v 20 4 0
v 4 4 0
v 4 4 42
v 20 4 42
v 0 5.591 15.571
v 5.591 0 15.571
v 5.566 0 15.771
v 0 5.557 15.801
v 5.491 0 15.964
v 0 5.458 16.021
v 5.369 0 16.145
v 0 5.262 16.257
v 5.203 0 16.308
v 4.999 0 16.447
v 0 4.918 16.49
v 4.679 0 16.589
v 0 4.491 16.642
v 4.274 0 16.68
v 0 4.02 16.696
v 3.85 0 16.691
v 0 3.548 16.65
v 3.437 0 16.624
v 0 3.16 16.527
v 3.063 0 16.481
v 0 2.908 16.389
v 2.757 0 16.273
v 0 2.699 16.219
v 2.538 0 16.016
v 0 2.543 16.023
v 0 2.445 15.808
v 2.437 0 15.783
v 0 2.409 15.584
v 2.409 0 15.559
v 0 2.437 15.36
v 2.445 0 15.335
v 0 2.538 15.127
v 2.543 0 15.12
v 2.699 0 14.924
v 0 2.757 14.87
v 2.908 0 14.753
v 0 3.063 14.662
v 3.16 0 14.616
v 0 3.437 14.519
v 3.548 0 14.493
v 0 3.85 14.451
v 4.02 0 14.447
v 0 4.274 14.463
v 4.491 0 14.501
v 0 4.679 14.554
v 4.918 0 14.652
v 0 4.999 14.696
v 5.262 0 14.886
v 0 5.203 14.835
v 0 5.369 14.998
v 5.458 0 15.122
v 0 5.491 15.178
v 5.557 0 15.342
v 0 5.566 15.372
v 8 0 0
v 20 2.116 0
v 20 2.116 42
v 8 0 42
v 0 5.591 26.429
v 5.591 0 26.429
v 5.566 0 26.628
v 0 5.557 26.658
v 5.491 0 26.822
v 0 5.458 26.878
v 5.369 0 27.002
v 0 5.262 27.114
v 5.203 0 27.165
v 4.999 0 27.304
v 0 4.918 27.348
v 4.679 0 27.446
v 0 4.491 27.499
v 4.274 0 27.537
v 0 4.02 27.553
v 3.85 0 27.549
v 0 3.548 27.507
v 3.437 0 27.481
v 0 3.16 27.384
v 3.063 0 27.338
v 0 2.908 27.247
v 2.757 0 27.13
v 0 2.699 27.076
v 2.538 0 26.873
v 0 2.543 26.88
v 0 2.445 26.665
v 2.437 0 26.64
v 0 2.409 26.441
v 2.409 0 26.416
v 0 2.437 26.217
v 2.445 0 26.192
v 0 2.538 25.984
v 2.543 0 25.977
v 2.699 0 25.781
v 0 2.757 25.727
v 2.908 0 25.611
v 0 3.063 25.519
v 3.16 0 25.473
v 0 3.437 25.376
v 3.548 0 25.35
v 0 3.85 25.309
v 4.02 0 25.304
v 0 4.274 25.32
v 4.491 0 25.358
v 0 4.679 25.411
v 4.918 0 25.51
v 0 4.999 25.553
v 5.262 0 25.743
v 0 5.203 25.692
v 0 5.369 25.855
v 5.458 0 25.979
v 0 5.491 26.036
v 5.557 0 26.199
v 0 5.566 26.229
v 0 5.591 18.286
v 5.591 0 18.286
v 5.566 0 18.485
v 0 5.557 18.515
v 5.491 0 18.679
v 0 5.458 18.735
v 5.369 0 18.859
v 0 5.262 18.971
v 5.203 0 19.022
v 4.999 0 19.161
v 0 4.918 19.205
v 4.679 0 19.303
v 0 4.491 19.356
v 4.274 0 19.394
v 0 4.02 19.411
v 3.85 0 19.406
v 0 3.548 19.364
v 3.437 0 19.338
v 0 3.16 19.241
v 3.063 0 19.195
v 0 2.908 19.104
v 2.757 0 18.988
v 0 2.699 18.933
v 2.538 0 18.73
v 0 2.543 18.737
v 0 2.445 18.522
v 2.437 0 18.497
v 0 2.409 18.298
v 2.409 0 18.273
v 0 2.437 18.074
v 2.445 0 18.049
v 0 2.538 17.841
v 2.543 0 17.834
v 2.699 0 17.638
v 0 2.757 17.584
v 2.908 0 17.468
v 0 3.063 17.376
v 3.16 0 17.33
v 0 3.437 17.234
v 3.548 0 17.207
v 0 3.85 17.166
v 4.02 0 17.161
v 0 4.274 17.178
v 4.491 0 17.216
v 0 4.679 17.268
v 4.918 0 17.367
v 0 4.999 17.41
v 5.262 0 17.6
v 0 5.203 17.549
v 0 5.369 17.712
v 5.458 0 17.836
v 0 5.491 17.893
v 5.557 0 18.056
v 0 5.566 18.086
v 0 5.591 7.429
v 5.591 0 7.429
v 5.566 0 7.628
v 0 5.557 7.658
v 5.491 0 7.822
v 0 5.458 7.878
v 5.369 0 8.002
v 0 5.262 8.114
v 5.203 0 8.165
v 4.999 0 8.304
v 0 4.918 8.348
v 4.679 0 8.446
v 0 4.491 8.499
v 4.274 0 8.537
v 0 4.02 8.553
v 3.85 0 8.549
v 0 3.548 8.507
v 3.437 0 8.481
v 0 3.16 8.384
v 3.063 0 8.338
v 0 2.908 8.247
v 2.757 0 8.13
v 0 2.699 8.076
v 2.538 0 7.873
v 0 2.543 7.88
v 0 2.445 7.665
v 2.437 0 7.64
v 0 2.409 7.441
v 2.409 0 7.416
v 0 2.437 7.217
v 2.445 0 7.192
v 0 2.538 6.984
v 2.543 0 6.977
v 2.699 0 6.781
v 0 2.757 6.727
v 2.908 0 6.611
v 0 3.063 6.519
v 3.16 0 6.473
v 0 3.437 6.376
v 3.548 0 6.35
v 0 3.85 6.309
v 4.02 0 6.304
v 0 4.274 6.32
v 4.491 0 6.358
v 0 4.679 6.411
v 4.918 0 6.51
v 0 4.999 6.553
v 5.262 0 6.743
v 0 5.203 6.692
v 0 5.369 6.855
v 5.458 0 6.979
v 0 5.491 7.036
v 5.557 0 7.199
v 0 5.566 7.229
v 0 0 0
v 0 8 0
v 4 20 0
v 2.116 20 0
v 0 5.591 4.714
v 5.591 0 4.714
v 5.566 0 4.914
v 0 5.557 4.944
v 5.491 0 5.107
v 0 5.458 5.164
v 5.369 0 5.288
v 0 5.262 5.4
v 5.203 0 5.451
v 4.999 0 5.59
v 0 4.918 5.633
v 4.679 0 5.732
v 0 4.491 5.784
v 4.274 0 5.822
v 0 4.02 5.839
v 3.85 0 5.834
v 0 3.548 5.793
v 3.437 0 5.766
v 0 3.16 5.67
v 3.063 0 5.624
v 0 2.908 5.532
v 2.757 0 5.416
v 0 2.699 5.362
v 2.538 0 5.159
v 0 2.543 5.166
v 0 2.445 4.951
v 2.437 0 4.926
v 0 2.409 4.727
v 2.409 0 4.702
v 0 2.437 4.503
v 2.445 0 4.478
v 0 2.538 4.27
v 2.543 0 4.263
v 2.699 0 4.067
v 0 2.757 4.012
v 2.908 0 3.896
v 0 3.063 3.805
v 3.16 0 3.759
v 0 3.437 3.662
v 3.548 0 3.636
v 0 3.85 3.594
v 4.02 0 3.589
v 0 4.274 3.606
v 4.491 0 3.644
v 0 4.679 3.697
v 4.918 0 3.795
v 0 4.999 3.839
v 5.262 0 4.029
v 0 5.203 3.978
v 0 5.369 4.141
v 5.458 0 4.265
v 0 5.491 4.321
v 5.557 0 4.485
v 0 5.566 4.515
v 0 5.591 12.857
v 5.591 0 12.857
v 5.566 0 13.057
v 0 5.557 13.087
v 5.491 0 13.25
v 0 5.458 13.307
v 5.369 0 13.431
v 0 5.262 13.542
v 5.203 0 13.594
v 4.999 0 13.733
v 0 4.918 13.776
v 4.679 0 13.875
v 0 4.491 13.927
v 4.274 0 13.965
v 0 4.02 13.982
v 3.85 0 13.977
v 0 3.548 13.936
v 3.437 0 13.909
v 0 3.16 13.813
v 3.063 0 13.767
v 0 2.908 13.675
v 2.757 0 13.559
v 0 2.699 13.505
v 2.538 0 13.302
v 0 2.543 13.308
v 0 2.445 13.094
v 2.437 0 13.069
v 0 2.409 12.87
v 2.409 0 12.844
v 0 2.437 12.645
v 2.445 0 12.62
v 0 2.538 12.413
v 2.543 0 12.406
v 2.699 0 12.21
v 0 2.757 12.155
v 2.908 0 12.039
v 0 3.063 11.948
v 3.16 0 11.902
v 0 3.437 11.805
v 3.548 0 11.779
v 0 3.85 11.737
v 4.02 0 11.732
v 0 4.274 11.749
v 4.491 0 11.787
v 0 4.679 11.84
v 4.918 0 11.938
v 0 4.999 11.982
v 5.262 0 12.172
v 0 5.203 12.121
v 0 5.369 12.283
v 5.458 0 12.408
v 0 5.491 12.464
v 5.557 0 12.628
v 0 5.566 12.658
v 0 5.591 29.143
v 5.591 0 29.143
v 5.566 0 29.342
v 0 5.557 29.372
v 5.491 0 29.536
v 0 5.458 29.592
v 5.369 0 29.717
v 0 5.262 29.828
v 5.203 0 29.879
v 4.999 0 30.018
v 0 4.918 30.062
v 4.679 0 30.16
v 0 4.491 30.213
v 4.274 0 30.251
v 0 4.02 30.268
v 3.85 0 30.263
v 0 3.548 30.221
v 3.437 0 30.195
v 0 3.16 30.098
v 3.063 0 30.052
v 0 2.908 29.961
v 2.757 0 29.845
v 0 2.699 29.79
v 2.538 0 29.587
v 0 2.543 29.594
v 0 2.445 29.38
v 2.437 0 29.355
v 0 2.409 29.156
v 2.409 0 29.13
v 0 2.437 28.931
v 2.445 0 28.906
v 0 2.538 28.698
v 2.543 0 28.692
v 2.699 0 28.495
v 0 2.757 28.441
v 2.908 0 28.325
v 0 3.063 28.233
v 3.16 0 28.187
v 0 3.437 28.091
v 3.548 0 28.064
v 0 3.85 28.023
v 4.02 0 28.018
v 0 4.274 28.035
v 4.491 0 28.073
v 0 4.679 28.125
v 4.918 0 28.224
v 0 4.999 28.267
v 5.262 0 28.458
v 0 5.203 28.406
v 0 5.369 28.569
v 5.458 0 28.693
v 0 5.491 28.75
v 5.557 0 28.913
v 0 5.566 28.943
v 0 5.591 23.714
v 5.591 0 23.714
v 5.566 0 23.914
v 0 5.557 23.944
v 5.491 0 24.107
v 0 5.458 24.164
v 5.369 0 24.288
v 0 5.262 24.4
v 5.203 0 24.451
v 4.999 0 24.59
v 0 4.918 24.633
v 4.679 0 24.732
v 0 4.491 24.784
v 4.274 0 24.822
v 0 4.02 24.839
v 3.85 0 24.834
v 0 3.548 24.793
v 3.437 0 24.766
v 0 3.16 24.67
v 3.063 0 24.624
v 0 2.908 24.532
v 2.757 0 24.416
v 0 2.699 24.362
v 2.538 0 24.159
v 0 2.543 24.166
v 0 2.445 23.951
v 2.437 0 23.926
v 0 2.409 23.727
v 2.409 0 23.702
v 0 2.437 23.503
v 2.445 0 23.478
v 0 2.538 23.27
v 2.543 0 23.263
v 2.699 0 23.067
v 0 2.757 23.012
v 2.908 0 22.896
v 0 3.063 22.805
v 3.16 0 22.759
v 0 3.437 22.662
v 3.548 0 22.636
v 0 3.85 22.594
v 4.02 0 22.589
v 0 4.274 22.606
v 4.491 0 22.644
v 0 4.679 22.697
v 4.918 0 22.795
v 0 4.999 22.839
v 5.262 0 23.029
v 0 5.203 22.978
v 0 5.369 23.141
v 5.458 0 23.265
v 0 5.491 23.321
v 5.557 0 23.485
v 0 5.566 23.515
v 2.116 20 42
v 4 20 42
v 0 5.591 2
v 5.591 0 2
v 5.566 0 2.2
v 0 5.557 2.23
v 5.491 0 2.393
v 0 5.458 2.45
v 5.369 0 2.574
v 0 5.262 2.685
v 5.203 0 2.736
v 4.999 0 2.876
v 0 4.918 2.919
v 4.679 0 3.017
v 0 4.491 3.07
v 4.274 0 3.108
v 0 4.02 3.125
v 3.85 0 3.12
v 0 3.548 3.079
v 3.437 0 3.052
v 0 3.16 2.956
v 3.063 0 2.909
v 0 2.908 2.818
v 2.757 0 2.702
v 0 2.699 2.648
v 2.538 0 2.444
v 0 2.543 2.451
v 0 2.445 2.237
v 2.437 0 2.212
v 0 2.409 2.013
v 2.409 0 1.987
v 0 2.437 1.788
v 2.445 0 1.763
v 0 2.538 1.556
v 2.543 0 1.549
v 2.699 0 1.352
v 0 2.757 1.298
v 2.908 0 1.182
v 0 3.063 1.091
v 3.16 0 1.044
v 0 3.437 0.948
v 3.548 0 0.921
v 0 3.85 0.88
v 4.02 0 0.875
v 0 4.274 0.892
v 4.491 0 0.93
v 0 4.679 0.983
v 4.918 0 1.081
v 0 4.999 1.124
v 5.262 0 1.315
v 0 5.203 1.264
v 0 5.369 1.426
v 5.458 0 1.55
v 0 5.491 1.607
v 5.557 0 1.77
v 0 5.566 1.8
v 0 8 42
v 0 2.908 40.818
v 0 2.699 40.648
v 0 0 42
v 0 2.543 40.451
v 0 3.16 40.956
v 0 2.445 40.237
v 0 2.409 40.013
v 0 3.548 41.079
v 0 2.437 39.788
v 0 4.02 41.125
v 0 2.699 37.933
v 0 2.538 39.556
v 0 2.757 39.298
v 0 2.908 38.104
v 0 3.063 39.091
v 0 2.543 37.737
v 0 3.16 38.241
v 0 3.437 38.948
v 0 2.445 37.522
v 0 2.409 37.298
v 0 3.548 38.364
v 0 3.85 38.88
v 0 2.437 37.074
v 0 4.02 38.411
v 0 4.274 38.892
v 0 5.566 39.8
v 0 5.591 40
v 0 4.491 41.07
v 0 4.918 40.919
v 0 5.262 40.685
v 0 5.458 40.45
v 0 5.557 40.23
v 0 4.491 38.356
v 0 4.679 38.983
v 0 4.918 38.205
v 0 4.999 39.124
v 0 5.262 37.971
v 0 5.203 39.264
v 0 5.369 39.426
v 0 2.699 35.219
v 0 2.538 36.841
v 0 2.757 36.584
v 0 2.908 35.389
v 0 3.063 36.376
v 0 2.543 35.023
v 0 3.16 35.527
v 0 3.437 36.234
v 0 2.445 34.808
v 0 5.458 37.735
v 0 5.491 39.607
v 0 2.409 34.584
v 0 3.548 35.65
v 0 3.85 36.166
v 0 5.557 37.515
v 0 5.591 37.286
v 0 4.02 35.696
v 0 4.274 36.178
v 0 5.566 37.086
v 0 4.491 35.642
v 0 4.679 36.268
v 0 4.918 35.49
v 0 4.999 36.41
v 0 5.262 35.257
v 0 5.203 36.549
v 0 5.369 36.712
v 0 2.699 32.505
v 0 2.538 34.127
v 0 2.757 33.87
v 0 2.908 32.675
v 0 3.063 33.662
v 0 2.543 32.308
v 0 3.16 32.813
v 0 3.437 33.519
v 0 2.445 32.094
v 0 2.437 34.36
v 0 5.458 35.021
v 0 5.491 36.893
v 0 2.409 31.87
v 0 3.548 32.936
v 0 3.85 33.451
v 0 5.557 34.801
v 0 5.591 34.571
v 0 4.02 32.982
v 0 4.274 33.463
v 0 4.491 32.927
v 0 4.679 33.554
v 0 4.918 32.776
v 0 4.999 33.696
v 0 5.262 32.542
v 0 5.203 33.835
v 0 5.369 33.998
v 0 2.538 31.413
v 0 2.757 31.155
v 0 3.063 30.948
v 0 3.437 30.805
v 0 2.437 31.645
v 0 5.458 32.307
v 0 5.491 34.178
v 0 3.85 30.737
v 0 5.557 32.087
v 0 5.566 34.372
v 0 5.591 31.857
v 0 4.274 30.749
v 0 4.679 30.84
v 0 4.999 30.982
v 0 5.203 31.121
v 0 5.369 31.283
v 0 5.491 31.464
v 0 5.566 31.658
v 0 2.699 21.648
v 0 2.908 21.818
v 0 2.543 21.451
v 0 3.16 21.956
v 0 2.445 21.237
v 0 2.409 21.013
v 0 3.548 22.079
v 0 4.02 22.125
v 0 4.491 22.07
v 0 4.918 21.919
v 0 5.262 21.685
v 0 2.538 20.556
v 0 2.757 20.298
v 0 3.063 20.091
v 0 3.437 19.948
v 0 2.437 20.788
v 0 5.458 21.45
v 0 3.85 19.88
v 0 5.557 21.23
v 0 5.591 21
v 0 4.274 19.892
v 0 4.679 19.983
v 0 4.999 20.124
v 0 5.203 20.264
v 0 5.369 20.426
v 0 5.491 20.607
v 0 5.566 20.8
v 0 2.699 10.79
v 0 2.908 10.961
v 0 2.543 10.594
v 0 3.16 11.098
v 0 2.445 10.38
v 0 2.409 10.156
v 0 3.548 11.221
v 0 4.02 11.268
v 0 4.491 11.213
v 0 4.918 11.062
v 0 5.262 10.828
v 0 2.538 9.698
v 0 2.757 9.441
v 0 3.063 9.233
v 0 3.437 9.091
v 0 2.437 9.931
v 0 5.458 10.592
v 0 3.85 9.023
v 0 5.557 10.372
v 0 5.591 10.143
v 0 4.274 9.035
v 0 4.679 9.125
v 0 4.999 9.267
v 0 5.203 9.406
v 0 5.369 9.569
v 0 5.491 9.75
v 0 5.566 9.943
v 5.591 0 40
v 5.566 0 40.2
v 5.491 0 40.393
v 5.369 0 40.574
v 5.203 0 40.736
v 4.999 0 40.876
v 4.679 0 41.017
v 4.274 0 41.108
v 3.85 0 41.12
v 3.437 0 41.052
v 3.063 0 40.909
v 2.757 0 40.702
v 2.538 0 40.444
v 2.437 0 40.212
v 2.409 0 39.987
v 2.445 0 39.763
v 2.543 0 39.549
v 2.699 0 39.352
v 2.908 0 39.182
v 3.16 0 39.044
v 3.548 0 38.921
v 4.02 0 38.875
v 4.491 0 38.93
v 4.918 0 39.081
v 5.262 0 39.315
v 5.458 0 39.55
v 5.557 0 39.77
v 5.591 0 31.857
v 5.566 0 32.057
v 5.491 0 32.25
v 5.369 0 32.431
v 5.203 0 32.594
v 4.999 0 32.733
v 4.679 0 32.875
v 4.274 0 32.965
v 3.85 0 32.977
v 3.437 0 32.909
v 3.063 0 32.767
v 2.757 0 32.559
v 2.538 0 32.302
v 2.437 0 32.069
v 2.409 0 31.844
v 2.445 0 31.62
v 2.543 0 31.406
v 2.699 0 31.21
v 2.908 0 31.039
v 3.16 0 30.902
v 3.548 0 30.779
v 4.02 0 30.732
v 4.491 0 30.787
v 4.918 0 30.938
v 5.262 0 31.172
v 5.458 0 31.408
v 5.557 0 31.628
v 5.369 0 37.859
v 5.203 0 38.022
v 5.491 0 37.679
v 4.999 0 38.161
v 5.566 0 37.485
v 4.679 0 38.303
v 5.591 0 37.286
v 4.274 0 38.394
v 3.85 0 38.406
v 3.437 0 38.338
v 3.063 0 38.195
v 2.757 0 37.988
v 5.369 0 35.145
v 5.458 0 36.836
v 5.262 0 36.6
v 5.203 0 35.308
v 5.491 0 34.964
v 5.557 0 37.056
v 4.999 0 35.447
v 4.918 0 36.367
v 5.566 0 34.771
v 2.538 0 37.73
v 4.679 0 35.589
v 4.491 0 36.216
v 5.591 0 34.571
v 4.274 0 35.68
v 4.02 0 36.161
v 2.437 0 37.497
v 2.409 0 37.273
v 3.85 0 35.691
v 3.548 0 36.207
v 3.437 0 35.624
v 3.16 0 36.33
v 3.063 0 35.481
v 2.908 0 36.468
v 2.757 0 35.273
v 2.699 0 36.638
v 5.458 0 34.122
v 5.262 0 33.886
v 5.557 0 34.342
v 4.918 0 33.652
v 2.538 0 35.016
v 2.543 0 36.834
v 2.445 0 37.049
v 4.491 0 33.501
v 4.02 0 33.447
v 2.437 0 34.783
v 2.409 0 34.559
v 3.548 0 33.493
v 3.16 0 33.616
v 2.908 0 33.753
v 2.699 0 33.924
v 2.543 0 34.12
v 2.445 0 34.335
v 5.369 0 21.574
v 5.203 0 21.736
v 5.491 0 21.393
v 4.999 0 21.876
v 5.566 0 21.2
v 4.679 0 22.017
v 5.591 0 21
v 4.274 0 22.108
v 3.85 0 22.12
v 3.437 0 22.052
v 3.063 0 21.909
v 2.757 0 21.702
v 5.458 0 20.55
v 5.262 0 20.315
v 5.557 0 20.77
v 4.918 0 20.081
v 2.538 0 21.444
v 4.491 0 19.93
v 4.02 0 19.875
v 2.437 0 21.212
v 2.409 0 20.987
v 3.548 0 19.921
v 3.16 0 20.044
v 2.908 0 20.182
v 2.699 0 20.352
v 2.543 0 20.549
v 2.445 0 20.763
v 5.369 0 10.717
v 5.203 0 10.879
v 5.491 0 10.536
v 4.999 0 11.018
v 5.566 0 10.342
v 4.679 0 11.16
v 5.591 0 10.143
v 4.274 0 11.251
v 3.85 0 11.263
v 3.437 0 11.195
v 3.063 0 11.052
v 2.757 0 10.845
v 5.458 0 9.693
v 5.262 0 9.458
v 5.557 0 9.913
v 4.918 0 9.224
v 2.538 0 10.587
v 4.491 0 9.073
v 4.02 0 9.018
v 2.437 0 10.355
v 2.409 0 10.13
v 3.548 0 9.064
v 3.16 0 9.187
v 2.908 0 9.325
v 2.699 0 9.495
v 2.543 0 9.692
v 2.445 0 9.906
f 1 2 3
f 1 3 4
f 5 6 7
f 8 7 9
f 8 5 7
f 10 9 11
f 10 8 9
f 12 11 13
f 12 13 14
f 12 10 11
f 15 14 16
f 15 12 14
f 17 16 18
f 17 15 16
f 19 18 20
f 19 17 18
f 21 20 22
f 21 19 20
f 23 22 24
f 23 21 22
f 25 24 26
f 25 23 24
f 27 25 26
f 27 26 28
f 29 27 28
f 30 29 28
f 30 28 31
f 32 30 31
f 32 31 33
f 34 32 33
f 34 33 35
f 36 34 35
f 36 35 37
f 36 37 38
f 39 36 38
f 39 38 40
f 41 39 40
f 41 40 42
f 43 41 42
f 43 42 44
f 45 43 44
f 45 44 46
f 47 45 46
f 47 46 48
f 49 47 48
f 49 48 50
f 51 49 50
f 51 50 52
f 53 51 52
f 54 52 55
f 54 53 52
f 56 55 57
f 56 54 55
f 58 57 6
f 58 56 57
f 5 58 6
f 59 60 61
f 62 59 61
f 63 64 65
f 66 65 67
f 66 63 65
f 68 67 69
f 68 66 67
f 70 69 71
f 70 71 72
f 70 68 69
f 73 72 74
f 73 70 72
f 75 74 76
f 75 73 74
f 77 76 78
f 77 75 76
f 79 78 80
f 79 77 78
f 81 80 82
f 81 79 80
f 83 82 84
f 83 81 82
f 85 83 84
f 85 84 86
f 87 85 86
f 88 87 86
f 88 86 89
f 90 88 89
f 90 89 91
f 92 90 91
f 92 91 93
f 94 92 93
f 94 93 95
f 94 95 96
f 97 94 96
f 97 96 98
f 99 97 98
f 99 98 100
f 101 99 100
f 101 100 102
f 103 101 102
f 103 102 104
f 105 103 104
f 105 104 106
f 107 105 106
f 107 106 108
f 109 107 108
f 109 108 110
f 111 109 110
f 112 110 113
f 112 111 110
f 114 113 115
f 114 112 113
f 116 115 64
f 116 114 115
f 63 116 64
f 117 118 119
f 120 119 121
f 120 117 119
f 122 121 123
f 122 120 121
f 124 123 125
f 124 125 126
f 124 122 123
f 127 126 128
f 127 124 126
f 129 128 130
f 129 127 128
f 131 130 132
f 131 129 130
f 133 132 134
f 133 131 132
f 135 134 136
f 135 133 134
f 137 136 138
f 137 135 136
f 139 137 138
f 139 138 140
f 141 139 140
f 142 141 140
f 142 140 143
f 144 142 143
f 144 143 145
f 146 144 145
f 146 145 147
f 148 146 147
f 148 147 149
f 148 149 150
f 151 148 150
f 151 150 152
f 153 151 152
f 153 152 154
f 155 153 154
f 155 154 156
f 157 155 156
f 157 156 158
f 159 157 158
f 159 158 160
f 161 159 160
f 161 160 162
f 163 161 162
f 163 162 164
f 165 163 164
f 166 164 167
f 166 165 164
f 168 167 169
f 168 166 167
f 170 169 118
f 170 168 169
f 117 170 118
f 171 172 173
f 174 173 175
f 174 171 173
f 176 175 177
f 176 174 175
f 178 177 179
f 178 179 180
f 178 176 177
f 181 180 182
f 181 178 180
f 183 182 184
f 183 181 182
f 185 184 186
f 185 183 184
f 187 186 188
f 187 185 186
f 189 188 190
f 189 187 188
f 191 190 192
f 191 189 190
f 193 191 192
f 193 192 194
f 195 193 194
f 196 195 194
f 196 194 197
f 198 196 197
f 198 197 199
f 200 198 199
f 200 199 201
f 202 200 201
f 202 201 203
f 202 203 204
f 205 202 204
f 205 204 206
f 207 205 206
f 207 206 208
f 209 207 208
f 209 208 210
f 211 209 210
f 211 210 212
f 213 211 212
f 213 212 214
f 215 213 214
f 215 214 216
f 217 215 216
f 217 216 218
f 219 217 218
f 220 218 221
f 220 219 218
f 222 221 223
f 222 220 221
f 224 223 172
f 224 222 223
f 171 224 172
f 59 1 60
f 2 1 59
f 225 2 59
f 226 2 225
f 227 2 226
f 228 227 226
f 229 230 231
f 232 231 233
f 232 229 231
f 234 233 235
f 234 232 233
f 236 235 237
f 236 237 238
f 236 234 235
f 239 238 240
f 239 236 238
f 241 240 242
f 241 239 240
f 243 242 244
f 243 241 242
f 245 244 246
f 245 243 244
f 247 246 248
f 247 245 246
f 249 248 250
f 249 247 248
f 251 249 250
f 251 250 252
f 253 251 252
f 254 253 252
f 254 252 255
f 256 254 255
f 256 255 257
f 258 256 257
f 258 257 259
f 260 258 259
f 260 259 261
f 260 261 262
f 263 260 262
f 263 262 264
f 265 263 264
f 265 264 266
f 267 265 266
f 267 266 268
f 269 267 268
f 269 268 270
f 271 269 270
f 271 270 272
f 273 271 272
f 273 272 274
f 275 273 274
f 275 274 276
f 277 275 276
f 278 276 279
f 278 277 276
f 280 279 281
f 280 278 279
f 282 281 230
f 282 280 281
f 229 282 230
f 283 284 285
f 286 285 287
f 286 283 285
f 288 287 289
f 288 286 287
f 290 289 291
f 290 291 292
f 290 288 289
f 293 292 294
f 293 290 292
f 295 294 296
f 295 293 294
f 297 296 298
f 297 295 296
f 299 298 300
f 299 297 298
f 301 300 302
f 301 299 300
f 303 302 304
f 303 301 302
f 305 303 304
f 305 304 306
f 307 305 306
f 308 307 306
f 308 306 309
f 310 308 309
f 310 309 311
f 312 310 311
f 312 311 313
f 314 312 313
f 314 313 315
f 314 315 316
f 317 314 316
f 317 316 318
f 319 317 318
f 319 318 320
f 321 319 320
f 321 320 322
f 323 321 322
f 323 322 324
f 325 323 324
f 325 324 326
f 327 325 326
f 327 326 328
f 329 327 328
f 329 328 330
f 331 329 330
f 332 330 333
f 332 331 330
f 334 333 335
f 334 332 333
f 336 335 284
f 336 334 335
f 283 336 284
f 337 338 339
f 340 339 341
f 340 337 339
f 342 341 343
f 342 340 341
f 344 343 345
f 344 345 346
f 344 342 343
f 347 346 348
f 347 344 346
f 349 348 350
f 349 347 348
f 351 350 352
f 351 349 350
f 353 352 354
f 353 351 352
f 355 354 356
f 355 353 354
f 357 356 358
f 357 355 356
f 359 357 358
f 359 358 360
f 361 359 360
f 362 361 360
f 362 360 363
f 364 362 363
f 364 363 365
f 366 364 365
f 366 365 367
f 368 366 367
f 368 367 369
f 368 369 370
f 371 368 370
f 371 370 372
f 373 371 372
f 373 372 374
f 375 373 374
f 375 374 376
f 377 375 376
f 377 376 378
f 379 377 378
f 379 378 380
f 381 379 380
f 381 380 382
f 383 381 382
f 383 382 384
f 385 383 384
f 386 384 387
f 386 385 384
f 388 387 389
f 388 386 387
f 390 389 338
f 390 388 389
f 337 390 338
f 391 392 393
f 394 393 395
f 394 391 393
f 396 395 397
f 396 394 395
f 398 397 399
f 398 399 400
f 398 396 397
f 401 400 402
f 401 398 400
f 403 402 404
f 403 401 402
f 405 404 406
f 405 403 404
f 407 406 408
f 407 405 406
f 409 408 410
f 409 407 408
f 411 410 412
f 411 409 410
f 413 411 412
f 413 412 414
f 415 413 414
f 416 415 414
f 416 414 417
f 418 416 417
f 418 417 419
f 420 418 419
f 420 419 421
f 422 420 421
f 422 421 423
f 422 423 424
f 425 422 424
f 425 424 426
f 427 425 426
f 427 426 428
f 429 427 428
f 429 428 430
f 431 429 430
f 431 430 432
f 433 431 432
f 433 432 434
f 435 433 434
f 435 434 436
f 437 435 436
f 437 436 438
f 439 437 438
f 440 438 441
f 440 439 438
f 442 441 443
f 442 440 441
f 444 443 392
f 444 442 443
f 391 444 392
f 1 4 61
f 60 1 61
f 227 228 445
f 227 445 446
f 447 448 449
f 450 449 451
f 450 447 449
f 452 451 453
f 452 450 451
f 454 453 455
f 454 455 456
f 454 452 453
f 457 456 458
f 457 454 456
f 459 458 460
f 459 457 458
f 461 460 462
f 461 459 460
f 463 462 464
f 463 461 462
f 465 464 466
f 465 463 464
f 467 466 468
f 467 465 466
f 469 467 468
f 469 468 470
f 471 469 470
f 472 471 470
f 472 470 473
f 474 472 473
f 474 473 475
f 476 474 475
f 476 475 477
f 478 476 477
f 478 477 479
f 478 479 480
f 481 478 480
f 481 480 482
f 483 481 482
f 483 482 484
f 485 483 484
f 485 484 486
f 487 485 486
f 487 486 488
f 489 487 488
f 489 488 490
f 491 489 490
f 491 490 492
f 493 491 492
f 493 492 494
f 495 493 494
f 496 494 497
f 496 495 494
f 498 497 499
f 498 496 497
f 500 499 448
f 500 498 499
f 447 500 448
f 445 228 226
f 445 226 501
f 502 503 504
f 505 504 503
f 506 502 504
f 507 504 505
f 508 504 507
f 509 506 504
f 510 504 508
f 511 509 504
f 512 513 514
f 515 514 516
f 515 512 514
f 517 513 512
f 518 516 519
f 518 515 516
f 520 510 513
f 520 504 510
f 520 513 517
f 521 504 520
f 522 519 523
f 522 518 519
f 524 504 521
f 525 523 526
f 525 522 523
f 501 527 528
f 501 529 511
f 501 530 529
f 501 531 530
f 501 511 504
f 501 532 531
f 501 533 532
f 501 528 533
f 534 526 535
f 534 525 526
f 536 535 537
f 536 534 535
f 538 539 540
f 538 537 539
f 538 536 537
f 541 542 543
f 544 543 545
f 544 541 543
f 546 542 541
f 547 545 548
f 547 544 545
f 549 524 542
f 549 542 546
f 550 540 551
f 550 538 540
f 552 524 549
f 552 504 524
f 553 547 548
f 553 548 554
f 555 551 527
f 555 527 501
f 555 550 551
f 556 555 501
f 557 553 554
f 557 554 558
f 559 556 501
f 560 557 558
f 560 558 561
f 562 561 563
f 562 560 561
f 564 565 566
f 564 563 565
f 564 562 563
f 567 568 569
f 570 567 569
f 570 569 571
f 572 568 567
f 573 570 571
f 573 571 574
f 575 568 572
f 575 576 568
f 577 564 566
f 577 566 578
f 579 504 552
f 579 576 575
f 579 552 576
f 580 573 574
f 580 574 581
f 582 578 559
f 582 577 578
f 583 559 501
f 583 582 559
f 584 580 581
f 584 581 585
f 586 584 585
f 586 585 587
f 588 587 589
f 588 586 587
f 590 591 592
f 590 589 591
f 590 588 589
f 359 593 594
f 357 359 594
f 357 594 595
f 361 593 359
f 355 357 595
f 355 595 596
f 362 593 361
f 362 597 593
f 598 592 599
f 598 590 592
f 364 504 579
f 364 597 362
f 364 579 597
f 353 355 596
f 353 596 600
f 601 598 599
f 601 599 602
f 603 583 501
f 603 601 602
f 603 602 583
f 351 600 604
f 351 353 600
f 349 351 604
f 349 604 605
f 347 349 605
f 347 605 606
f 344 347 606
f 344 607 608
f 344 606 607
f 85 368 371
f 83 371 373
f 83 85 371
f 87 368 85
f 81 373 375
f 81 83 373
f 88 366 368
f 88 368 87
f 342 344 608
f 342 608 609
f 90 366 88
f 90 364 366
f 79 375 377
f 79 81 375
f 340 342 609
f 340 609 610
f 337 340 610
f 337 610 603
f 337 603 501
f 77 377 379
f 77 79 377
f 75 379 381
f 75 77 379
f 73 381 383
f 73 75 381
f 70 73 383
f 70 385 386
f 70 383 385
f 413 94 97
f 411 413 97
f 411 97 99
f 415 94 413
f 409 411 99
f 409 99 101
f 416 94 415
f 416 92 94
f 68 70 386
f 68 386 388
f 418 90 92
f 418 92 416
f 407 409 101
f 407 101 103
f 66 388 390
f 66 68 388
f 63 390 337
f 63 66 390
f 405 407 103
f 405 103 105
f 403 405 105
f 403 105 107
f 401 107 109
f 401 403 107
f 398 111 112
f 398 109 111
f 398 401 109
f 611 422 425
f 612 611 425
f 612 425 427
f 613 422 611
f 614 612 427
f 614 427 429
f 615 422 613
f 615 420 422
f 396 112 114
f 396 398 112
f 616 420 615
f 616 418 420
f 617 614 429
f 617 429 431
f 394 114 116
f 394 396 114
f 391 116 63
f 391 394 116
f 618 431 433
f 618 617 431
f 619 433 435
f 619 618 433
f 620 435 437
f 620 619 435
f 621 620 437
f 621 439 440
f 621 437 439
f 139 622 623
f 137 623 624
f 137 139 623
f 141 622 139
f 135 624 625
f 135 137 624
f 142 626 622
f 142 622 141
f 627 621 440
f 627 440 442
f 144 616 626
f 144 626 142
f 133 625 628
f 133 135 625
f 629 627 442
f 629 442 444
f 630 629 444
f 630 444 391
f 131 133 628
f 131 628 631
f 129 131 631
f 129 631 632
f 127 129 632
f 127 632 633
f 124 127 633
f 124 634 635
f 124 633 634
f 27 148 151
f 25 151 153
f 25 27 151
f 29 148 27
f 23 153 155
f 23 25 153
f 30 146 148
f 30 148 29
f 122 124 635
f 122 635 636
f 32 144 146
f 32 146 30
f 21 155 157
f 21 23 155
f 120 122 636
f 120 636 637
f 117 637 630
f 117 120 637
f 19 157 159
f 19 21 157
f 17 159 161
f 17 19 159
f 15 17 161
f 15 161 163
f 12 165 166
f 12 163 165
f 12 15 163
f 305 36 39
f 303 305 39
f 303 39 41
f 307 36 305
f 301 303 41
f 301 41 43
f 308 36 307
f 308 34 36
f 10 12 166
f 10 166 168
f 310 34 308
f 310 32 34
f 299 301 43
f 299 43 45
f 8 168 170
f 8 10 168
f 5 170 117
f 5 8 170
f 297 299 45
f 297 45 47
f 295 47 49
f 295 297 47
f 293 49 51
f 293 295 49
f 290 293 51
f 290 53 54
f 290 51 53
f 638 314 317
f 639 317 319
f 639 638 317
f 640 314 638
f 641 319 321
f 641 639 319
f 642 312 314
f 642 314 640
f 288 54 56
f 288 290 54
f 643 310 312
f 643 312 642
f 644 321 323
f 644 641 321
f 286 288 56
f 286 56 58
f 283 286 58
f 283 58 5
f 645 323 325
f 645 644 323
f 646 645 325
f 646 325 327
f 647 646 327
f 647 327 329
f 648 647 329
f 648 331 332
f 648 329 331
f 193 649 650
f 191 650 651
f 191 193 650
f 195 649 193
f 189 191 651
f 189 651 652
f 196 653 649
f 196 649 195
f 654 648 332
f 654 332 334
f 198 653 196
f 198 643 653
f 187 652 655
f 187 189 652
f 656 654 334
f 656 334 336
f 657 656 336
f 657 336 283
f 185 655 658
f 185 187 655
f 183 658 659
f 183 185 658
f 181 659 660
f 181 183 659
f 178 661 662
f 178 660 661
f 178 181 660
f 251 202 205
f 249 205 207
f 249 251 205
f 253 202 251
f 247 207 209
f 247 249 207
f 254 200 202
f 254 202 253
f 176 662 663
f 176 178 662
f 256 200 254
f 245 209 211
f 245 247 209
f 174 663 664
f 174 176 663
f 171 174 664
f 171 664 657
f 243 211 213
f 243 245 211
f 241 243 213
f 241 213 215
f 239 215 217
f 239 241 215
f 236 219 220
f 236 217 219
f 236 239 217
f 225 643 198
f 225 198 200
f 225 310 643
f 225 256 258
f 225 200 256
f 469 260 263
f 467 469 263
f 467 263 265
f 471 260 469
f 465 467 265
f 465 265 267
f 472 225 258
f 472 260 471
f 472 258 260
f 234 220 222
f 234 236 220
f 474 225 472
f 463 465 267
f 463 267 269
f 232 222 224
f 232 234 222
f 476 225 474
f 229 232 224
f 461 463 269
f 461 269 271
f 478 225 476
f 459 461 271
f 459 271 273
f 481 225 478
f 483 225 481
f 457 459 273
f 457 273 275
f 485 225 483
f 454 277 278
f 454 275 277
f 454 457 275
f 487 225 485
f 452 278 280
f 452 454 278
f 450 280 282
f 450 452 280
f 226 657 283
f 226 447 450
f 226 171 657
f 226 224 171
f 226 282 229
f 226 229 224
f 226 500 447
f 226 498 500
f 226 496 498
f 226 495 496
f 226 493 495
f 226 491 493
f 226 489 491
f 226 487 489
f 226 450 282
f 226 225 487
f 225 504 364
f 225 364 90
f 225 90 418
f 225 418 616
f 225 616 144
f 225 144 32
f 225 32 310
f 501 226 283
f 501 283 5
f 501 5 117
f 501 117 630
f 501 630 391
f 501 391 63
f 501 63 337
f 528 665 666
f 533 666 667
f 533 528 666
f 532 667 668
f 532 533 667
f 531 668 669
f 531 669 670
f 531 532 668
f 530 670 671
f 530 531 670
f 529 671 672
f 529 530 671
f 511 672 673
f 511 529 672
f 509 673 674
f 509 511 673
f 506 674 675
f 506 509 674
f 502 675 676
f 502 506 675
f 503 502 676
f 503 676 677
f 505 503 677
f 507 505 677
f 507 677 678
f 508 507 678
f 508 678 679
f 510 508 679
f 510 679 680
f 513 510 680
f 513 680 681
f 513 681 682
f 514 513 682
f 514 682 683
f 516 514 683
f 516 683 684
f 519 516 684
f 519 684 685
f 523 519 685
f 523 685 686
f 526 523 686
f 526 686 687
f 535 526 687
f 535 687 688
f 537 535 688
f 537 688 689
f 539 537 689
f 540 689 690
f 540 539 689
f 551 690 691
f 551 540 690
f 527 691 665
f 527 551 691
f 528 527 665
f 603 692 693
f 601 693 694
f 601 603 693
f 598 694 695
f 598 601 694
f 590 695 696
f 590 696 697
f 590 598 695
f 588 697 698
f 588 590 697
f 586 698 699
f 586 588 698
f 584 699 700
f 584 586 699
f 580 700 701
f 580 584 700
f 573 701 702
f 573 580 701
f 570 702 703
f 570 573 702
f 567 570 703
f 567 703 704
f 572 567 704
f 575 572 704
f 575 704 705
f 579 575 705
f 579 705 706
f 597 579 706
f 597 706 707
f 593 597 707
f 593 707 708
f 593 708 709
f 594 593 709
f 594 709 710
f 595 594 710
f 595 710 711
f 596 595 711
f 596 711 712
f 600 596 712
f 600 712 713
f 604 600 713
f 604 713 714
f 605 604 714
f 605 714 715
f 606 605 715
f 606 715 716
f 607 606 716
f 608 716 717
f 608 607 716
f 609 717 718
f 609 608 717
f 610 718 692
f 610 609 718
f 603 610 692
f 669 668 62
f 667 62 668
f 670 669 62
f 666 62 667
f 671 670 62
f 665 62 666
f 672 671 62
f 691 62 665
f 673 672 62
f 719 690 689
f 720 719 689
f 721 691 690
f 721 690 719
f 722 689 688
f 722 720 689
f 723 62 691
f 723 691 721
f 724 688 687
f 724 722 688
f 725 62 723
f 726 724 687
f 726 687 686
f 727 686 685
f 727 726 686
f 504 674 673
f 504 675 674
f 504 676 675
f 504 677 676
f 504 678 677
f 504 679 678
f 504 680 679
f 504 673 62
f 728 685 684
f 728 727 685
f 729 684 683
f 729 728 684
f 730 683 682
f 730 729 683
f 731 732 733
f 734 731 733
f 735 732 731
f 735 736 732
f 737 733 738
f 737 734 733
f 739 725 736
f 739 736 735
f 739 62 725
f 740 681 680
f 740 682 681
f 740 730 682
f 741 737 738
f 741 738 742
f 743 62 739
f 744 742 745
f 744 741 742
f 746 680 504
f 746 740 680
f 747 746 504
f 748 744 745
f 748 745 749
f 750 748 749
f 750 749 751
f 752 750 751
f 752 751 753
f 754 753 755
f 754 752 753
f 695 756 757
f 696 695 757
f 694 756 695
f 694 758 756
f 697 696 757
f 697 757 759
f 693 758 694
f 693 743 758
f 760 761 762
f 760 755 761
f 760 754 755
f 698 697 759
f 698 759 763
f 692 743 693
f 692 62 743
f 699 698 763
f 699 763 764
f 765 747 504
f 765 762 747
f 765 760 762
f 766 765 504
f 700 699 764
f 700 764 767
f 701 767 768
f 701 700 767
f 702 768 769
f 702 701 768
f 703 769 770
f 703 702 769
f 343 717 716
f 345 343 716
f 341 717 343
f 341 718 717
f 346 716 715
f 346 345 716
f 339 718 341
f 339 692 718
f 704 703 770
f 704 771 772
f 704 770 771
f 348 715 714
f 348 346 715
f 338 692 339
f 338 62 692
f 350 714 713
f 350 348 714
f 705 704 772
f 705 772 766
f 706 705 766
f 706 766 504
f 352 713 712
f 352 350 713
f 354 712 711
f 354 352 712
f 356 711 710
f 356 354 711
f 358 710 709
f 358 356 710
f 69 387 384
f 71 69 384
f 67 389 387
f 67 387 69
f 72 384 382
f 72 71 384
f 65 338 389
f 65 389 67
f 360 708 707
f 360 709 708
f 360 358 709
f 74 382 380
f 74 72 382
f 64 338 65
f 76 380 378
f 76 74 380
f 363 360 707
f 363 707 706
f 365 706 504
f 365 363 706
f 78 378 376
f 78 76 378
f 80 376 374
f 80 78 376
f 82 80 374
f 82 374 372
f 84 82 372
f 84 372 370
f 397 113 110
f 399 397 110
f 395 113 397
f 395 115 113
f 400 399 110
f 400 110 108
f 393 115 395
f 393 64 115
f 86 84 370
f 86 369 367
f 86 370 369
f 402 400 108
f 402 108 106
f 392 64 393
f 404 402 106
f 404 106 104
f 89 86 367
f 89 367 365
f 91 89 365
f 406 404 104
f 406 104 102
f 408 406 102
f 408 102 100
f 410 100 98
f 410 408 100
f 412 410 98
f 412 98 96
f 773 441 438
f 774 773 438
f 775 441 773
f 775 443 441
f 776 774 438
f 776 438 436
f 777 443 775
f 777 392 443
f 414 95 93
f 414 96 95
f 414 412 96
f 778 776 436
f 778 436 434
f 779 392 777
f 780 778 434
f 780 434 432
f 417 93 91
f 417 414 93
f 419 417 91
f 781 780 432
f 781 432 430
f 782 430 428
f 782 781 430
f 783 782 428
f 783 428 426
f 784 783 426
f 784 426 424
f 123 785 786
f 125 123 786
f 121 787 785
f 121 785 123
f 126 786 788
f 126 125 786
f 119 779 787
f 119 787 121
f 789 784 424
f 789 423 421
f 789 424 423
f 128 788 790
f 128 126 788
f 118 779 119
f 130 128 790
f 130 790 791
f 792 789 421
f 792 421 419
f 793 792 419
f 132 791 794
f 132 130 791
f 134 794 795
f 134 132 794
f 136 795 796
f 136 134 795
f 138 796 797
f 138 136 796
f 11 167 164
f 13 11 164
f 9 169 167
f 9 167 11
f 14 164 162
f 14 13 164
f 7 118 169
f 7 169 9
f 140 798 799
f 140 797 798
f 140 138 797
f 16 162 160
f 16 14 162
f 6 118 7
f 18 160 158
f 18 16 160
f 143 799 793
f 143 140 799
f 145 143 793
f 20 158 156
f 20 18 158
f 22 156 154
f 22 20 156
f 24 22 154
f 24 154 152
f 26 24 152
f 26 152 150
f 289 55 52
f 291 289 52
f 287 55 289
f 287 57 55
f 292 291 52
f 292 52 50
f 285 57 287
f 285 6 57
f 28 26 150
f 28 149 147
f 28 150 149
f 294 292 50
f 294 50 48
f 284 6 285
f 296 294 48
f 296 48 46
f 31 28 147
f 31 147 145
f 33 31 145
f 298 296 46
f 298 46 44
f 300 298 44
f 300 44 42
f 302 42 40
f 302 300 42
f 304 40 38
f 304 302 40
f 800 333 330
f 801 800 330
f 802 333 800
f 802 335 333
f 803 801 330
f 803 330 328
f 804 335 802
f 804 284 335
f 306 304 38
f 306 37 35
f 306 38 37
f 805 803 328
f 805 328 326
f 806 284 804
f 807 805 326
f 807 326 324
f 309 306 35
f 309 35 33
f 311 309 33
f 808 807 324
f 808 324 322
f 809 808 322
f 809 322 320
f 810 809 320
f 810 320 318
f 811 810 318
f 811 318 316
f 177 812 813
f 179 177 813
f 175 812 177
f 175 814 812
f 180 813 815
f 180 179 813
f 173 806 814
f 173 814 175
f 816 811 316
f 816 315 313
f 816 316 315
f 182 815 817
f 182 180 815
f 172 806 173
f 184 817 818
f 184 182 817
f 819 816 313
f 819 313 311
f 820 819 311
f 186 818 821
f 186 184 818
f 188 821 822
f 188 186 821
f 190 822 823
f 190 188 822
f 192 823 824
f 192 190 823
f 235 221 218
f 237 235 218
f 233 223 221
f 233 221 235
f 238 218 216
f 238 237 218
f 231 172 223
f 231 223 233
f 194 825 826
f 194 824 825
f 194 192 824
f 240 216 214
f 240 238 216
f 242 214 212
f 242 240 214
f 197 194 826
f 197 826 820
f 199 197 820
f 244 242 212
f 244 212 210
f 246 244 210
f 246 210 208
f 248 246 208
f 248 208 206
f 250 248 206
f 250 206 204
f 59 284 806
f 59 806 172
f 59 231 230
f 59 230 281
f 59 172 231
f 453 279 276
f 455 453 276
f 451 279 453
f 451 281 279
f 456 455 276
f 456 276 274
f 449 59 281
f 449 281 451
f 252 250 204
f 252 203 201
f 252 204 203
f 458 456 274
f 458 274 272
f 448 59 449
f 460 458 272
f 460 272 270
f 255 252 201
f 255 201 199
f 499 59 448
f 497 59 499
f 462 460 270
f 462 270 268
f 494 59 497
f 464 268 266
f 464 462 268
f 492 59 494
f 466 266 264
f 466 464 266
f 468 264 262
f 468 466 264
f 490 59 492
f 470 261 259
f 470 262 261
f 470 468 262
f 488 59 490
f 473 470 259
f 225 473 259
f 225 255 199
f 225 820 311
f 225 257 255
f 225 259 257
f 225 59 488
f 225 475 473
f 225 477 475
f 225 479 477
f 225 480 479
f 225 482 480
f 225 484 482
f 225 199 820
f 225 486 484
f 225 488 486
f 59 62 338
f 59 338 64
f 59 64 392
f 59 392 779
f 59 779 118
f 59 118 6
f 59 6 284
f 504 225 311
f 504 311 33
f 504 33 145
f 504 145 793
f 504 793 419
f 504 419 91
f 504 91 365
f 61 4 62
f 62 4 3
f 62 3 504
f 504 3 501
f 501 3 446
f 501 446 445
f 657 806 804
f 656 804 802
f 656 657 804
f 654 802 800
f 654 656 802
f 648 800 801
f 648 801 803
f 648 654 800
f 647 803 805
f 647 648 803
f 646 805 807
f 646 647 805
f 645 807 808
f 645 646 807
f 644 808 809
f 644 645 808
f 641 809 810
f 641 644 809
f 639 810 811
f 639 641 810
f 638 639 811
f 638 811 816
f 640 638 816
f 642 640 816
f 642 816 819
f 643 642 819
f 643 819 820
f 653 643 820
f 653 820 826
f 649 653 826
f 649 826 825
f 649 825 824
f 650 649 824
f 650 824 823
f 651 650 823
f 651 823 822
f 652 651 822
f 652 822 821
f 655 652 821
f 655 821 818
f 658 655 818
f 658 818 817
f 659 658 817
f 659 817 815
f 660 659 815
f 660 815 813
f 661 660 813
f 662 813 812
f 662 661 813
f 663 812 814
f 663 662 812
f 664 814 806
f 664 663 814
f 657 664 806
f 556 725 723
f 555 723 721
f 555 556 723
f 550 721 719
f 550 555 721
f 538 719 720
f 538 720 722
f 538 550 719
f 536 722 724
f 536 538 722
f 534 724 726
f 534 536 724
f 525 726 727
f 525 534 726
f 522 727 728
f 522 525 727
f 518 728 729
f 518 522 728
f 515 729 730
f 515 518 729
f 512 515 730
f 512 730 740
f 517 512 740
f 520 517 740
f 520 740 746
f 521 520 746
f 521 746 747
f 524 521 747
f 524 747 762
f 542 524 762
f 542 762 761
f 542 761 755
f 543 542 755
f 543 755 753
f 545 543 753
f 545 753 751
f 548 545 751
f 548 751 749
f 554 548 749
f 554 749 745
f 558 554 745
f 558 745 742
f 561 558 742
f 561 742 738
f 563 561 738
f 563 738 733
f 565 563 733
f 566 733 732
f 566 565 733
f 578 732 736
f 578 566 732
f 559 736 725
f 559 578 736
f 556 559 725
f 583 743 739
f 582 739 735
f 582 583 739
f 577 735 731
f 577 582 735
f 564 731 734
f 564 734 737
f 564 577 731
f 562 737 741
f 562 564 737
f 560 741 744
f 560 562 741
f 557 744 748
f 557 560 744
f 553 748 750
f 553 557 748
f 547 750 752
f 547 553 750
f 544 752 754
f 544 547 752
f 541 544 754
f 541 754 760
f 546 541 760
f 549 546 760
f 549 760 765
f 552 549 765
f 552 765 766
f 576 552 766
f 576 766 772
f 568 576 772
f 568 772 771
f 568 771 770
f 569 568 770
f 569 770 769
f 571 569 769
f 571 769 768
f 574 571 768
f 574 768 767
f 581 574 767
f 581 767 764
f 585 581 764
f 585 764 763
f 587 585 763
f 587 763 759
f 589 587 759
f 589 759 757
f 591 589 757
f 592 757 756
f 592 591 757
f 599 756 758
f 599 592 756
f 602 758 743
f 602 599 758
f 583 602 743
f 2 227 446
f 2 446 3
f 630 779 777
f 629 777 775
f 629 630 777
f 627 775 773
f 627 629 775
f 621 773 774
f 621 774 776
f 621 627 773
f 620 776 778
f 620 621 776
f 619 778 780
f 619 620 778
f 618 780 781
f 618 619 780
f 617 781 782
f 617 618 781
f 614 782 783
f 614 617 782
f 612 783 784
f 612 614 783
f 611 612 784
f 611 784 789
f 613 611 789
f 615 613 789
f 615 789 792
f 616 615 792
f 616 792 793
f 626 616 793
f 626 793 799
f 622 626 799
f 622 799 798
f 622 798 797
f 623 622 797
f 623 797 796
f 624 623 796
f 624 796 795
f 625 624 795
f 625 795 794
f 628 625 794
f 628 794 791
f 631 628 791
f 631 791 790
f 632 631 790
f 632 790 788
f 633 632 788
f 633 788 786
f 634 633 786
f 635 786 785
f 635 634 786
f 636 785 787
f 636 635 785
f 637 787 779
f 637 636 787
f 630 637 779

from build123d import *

# Parameters (mm, degrees)
BOSS_EXTRUDE1_DEPTH     = 42
CUT_EXTRUDE1_DEPTH      = 51.635955605
CUT_EXTRUDE1_DEPTH_BACK = 51.635955605
SKETCH2_R               = 1.125
CHAMFER1_SIZE           = 12
CHAMFER1_SIZE2          = 2.115923769
CHAMFER2_SIZE           = 12
CHAMFER2_SIZE2          = 2.115923769


with BuildPart() as part:
    # Sketch1 → Boss-Extrude1 (new body)
    with BuildSketch(Plane.XY):
        Polygon((0, 0), (0, 20), (4, 20), (4, 4), (20, 4), (20, 0), align=None)
    extrude(amount=BOSS_EXTRUDE1_DEPTH)

    # Sketch2 → Cut-Extrude1 (cut, two sides: drawn at the far end of the back side and taken through both)
    with BuildSketch(Plane(origin=(0, 0, 0), x_dir=(0, 0, -1), z_dir=(0.7071067811865475, -0.7071067811865477, 0)).offset(-CUT_EXTRUDE1_DEPTH_BACK)):
        with Locations(Location((-40, 2.828427125, 0), (0, 0, 90))):
            Circle(SKETCH2_R)
        with Locations(Location((-37.285714286, 2.828427125, 0), (0, 0, 90))):
            Circle(SKETCH2_R)
        with Locations(Location((-34.571428571, 2.828427125, 0), (0, 0, 90))):
            Circle(SKETCH2_R)
        with Locations(Location((-31.857142857, 2.828427125, 0), (0, 0, 90))):
            Circle(SKETCH2_R)
        with Locations(Location((-29.142857143, 2.828427125, 0), (0, 0, 90))):
            Circle(SKETCH2_R)
        with Locations(Location((-26.428571429, 2.828427125, 0), (0, 0, 90))):
            Circle(SKETCH2_R)
        with Locations(Location((-23.714285714, 2.828427125, 0), (0, 0, 90))):
            Circle(SKETCH2_R)
        with Locations(Location((-21, 2.828427125, 0), (0, 0, 90))):
            Circle(SKETCH2_R)
        with Locations(Location((-18.285714286, 2.828427125, 0), (0, 0, 90))):
            Circle(SKETCH2_R)
        with Locations(Location((-15.571428571, 2.828427125, 0), (0, 0, 90))):
            Circle(SKETCH2_R)
        with Locations(Location((-12.857142857, 2.828427125, 0), (0, 0, 90))):
            Circle(SKETCH2_R)
        with Locations(Location((-10.142857143, 2.828427125, 0), (0, 0, 90))):
            Circle(SKETCH2_R)
        with Locations(Location((-7.428571429, 2.828427125, 0), (0, 0, 90))):
            Circle(SKETCH2_R)
        with Locations(Location((-4.714285714, 2.828427125, 0), (0, 0, 90))):
            Circle(SKETCH2_R)
        with Locations(Location((-2, 2.828427125, 0), (0, 0, 90))):
            Circle(SKETCH2_R)
    extrude(amount=CUT_EXTRUDE1_DEPTH + CUT_EXTRUDE1_DEPTH_BACK, mode=Mode.SUBTRACT)

    # Chamfer1
    chamfer1_edges = [part.edges().sort_by_distance(p)[0] for p in [
        (20, 0, 21),
    ]]
    chamfer1_side = [part.faces().sort_by_distance(p)[0] for p in [
        (10.669713524, 0, 21),
    ]]
    chamfer(chamfer1_edges, length=CHAMFER1_SIZE, length2=CHAMFER1_SIZE2, reference=chamfer1_side[0])

    # Chamfer2
    chamfer2_edges = [part.edges().sort_by_distance(p)[0] for p in [
        (0, 20, 21),
    ]]
    chamfer2_side = [part.faces().sort_by_distance(p)[0] for p in [
        (0, 10.669713524, 21),
    ]]
    chamfer(chamfer2_edges, length=CHAMFER2_SIZE, length2=CHAMFER2_SIZE2, reference=chamfer2_side[0])


solid = part.part
